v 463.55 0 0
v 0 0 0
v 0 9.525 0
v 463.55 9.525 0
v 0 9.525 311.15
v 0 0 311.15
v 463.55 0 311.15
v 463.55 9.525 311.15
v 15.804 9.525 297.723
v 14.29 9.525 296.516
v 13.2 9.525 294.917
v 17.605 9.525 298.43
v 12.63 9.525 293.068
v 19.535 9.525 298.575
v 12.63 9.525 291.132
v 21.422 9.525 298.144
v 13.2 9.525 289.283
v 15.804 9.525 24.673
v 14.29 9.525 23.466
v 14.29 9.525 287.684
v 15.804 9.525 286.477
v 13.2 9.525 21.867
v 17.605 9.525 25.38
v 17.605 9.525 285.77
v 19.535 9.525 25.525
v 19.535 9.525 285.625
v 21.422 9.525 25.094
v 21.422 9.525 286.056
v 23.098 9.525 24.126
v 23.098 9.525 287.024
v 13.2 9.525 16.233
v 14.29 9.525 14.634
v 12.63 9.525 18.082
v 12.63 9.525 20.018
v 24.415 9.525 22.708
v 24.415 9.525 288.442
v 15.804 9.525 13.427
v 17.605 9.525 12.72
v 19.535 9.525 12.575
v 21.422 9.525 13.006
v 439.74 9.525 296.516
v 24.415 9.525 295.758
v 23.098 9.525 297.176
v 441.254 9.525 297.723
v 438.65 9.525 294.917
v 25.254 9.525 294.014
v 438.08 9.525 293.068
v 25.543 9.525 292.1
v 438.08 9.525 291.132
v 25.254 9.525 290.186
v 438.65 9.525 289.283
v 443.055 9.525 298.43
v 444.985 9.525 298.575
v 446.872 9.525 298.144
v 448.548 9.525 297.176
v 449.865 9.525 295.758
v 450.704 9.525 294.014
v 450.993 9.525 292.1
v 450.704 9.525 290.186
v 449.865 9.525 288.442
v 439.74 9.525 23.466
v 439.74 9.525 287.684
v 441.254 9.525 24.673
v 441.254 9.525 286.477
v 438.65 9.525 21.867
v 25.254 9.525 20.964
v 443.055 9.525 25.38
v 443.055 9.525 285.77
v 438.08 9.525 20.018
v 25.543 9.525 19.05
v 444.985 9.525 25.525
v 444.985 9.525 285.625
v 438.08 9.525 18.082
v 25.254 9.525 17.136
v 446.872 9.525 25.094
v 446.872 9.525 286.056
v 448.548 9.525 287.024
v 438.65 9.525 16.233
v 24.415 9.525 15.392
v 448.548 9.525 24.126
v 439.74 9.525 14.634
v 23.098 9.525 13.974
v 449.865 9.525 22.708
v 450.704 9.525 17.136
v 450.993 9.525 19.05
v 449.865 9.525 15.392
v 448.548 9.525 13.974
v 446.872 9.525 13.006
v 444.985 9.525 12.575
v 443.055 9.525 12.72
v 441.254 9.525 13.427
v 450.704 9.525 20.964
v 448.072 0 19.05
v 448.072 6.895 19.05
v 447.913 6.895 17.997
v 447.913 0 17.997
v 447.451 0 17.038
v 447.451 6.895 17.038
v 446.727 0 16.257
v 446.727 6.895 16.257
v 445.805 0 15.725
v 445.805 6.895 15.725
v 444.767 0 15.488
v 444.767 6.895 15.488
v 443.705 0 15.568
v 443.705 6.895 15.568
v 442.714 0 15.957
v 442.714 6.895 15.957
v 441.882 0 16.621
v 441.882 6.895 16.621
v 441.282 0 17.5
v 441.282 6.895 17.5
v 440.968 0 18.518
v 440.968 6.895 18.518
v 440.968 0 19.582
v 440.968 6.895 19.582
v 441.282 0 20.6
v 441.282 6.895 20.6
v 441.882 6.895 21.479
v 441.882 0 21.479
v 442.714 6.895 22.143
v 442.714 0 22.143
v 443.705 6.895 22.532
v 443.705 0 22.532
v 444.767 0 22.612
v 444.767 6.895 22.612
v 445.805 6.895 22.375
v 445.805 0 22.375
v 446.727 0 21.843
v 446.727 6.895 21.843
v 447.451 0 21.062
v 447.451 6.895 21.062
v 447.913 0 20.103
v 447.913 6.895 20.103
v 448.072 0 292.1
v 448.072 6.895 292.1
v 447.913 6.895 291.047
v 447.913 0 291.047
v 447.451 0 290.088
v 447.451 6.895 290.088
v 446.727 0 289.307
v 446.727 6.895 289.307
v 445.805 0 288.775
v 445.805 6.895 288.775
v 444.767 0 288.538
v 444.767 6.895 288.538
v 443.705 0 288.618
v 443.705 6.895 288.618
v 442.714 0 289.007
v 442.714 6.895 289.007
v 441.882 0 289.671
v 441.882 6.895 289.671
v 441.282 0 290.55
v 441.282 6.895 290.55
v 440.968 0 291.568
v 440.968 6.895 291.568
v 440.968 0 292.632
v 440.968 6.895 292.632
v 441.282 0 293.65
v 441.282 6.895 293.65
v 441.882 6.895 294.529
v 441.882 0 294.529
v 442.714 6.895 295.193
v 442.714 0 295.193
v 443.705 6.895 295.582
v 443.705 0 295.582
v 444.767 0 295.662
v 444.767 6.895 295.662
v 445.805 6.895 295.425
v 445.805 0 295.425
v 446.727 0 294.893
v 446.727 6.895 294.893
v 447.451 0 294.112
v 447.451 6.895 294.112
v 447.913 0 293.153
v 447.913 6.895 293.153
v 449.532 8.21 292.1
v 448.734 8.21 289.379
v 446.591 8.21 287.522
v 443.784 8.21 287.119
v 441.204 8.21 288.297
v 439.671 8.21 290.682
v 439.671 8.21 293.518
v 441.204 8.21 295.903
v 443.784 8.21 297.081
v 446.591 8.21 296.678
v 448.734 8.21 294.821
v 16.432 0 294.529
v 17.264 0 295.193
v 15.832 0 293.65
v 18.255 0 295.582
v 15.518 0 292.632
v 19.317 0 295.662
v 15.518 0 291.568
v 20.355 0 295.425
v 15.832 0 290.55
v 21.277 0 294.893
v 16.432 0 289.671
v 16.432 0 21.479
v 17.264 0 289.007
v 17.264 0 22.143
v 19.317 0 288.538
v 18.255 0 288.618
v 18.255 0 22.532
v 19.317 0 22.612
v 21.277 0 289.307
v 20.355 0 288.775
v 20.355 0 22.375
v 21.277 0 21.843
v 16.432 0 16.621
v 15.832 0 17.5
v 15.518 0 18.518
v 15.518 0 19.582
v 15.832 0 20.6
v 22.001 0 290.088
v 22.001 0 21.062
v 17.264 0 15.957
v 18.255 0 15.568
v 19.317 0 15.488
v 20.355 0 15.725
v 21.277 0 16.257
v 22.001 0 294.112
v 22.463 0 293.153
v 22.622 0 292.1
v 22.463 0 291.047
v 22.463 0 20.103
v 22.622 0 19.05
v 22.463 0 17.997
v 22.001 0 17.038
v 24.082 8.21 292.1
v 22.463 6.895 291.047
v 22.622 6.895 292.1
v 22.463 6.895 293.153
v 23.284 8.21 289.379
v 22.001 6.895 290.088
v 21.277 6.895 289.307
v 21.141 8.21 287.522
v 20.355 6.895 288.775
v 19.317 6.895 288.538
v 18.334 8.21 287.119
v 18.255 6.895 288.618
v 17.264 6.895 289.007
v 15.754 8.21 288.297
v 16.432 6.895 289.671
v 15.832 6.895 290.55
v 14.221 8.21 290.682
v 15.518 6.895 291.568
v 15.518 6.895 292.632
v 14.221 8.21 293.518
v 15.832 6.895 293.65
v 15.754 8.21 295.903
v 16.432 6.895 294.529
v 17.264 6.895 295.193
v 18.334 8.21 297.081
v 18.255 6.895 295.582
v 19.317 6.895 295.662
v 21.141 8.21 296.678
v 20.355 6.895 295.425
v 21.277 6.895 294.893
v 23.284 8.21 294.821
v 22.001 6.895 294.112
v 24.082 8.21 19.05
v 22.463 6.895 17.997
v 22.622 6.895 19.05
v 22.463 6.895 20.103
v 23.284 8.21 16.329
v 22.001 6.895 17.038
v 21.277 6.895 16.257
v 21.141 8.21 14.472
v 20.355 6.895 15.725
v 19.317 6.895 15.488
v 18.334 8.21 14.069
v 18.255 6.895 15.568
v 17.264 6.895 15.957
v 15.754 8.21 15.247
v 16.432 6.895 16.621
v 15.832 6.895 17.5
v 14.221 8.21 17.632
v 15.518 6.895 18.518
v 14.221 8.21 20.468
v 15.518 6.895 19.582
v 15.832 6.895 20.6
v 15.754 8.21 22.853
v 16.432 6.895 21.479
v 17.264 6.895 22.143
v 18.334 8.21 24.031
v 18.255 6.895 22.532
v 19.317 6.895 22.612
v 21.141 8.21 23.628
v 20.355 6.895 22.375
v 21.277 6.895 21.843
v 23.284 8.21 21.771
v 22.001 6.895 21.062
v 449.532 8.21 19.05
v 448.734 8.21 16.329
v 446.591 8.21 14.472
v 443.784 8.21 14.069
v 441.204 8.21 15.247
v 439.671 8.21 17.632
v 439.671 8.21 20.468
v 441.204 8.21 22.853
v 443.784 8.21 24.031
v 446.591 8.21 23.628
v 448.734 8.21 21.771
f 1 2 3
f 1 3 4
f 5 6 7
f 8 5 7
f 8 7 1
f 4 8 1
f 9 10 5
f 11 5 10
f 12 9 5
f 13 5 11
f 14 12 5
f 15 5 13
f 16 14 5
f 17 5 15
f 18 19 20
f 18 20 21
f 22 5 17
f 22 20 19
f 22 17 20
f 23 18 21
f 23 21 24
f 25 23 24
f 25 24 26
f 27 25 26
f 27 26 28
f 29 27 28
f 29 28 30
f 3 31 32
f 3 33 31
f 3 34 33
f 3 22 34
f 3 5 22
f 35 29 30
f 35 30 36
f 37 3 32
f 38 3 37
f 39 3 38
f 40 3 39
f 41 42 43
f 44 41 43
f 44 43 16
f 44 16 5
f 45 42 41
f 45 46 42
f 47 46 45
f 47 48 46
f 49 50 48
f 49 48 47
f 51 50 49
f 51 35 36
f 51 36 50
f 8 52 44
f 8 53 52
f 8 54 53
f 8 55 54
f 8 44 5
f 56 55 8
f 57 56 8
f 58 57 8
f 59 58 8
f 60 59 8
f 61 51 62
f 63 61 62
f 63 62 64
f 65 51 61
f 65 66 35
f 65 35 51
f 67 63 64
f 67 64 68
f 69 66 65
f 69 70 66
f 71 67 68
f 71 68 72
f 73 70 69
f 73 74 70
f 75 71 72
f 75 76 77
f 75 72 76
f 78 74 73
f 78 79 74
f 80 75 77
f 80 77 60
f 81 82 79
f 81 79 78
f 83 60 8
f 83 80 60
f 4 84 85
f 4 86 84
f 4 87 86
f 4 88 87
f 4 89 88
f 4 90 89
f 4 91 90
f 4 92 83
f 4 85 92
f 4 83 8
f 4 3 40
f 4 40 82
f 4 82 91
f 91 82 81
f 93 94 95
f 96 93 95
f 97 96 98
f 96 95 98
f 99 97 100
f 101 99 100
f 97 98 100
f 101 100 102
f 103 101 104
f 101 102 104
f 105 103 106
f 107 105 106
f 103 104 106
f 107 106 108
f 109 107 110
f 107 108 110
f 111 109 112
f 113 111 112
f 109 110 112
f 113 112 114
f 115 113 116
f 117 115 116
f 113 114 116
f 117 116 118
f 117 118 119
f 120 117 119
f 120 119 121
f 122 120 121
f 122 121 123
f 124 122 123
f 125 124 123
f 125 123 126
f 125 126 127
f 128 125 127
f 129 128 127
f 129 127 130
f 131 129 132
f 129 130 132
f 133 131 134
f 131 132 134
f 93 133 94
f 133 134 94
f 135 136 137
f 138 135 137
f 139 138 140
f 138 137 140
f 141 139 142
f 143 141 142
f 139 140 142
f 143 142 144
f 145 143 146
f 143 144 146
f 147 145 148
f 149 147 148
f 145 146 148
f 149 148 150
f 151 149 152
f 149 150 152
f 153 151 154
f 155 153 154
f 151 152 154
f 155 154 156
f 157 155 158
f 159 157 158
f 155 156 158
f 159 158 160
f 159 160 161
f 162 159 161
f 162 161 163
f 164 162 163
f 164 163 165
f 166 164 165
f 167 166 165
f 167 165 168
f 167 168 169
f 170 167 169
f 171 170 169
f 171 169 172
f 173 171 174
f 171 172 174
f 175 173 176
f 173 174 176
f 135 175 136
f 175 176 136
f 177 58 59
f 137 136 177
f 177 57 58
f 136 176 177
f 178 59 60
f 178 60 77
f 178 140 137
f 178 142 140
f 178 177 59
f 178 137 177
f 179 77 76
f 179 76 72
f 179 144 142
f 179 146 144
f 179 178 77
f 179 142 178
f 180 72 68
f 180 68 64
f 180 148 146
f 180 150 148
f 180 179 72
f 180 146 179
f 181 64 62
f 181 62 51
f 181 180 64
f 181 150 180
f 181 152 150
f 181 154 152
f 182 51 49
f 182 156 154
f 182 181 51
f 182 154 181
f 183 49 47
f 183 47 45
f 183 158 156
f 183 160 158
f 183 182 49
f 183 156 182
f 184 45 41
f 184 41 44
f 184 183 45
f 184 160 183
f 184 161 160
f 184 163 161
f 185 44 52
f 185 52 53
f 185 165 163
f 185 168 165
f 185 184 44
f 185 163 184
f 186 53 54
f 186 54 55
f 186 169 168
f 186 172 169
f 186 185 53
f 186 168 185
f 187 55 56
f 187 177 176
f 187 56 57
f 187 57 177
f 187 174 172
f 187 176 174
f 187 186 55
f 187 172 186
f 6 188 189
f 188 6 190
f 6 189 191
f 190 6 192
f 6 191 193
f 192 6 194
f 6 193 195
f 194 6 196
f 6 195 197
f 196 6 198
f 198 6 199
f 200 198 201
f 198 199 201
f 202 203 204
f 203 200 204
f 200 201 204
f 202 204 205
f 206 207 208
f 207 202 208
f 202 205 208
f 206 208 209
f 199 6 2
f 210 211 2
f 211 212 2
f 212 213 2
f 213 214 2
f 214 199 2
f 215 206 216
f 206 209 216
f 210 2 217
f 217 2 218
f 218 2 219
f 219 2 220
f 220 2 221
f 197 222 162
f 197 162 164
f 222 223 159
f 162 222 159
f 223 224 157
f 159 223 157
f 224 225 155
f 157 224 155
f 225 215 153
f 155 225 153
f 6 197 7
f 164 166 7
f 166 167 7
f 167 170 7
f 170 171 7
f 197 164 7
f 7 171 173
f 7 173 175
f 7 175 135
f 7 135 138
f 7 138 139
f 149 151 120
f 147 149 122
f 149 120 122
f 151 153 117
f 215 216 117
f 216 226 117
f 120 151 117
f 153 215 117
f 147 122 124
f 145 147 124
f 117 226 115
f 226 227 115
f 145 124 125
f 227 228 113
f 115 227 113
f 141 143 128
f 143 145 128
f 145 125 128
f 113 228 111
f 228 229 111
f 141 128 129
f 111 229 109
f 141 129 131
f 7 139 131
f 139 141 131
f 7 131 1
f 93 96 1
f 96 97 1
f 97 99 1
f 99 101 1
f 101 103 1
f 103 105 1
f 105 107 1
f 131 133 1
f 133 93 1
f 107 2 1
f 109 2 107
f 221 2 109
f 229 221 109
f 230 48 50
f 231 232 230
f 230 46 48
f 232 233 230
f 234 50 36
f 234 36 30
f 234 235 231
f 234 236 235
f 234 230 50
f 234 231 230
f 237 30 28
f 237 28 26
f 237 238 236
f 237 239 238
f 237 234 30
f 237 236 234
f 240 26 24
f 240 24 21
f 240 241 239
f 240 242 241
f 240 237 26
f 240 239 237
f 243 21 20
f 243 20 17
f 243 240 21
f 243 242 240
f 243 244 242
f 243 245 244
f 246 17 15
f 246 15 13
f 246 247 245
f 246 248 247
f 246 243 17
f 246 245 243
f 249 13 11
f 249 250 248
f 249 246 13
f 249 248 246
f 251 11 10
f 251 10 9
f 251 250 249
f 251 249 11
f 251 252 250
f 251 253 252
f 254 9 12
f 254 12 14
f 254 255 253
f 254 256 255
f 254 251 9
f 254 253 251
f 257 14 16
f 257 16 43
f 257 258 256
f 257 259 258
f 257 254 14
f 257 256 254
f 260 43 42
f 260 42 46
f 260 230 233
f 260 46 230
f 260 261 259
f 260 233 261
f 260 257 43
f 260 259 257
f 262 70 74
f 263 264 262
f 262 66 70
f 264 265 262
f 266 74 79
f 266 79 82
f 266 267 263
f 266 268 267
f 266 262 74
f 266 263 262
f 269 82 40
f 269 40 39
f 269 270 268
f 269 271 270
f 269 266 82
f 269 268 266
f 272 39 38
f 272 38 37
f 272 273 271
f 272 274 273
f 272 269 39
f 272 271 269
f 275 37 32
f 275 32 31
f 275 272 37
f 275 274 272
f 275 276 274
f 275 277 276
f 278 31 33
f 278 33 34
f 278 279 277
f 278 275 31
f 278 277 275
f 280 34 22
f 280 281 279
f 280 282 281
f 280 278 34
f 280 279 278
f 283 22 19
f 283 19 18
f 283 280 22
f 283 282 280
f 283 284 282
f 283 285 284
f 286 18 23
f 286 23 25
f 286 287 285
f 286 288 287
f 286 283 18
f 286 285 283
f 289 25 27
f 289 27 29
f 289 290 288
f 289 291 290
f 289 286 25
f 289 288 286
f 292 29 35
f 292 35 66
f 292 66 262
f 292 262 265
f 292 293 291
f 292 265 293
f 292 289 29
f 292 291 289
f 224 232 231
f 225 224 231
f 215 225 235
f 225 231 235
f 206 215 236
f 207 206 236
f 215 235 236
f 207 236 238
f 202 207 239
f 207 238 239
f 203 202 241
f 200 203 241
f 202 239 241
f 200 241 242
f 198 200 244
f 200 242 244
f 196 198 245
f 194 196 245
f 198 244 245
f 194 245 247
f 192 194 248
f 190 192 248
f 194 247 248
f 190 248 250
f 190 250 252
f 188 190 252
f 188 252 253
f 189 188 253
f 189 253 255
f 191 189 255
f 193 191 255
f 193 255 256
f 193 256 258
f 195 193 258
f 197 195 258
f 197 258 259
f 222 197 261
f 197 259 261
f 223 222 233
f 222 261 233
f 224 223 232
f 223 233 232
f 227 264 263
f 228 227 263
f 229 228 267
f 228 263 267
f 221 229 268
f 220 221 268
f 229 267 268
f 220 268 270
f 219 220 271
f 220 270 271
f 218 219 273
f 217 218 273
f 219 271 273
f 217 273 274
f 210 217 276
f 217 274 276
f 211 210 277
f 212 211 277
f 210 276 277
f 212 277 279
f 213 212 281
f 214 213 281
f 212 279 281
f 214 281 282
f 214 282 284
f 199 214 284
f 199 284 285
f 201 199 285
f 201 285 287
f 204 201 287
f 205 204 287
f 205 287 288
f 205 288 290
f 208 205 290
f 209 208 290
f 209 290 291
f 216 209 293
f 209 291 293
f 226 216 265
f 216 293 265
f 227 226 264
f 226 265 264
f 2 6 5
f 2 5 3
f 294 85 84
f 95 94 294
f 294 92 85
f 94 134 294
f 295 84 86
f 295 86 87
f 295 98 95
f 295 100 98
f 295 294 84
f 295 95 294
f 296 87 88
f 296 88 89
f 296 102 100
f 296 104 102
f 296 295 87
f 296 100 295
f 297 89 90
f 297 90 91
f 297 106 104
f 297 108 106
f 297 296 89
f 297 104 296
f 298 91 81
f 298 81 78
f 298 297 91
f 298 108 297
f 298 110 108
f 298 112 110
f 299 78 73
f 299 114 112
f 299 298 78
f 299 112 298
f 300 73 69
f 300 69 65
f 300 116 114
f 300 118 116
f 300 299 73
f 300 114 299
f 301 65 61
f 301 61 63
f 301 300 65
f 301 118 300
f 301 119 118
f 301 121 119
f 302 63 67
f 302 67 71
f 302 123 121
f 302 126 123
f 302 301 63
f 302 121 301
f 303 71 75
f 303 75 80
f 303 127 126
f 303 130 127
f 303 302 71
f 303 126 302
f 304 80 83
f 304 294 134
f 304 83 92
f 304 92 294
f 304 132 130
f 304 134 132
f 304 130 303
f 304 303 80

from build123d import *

# Parameters (mm, degrees)
SKETCH1_W           = 463.55
SKETCH1_H           = 311.15
BOSS_EXTRUDE1_DEPTH = 9.525
SKETCH2_R           = 3.571875
CUT_EXTRUDE1_DEPTH  = 9.525
CHAMFER1_SIZE       = 2.921
CHAMFER1_SIZE2      = 2.630080213


with BuildPart() as part:
    # Sketch1 → Boss-Extrude1 (new body)
    with BuildSketch(Plane(origin=(0, 0, 0), x_dir=(1, 0, 0), z_dir=(0, 1, 0))):
        with Locations((231.775, -155.575)):
            Rectangle(SKETCH1_W, SKETCH1_H)
    extrude(amount=BOSS_EXTRUDE1_DEPTH)

    # Sketch2 → Cut-Extrude1 (cut)
    with BuildSketch(Plane(origin=(0, 9.525, 0), x_dir=(1, 0, 0), z_dir=(0, 1, 0))):
        with Locations((444.5, -19.05)):
            Circle(SKETCH2_R)
        with Locations((19.05, -19.05)):
            Circle(SKETCH2_R)
        with Locations((444.5, -292.1)):
            Circle(SKETCH2_R)
        with Locations((19.05, -292.1)):
            Circle(SKETCH2_R)
    extrude(amount=-CUT_EXTRUDE1_DEPTH, mode=Mode.SUBTRACT)

    # Chamfer1
    chamfer1_edges = [part.edges().sort_by_distance(p)[0] for p in [
        (440.928125, 9.525, 19.05),
        (15.478125, 9.525, 19.05),
        (440.928125, 9.525, 292.1),
        (15.478125, 9.525, 292.1),
    ]]
    chamfer1_side = [part.faces().sort_by_distance(p)[0] for p in [
        (231.775, 9.525, 155.575),
    ]]
    chamfer(chamfer1_edges, length=CHAMFER1_SIZE, length2=CHAMFER1_SIZE2, reference=chamfer1_side[0])


solid = part.part
